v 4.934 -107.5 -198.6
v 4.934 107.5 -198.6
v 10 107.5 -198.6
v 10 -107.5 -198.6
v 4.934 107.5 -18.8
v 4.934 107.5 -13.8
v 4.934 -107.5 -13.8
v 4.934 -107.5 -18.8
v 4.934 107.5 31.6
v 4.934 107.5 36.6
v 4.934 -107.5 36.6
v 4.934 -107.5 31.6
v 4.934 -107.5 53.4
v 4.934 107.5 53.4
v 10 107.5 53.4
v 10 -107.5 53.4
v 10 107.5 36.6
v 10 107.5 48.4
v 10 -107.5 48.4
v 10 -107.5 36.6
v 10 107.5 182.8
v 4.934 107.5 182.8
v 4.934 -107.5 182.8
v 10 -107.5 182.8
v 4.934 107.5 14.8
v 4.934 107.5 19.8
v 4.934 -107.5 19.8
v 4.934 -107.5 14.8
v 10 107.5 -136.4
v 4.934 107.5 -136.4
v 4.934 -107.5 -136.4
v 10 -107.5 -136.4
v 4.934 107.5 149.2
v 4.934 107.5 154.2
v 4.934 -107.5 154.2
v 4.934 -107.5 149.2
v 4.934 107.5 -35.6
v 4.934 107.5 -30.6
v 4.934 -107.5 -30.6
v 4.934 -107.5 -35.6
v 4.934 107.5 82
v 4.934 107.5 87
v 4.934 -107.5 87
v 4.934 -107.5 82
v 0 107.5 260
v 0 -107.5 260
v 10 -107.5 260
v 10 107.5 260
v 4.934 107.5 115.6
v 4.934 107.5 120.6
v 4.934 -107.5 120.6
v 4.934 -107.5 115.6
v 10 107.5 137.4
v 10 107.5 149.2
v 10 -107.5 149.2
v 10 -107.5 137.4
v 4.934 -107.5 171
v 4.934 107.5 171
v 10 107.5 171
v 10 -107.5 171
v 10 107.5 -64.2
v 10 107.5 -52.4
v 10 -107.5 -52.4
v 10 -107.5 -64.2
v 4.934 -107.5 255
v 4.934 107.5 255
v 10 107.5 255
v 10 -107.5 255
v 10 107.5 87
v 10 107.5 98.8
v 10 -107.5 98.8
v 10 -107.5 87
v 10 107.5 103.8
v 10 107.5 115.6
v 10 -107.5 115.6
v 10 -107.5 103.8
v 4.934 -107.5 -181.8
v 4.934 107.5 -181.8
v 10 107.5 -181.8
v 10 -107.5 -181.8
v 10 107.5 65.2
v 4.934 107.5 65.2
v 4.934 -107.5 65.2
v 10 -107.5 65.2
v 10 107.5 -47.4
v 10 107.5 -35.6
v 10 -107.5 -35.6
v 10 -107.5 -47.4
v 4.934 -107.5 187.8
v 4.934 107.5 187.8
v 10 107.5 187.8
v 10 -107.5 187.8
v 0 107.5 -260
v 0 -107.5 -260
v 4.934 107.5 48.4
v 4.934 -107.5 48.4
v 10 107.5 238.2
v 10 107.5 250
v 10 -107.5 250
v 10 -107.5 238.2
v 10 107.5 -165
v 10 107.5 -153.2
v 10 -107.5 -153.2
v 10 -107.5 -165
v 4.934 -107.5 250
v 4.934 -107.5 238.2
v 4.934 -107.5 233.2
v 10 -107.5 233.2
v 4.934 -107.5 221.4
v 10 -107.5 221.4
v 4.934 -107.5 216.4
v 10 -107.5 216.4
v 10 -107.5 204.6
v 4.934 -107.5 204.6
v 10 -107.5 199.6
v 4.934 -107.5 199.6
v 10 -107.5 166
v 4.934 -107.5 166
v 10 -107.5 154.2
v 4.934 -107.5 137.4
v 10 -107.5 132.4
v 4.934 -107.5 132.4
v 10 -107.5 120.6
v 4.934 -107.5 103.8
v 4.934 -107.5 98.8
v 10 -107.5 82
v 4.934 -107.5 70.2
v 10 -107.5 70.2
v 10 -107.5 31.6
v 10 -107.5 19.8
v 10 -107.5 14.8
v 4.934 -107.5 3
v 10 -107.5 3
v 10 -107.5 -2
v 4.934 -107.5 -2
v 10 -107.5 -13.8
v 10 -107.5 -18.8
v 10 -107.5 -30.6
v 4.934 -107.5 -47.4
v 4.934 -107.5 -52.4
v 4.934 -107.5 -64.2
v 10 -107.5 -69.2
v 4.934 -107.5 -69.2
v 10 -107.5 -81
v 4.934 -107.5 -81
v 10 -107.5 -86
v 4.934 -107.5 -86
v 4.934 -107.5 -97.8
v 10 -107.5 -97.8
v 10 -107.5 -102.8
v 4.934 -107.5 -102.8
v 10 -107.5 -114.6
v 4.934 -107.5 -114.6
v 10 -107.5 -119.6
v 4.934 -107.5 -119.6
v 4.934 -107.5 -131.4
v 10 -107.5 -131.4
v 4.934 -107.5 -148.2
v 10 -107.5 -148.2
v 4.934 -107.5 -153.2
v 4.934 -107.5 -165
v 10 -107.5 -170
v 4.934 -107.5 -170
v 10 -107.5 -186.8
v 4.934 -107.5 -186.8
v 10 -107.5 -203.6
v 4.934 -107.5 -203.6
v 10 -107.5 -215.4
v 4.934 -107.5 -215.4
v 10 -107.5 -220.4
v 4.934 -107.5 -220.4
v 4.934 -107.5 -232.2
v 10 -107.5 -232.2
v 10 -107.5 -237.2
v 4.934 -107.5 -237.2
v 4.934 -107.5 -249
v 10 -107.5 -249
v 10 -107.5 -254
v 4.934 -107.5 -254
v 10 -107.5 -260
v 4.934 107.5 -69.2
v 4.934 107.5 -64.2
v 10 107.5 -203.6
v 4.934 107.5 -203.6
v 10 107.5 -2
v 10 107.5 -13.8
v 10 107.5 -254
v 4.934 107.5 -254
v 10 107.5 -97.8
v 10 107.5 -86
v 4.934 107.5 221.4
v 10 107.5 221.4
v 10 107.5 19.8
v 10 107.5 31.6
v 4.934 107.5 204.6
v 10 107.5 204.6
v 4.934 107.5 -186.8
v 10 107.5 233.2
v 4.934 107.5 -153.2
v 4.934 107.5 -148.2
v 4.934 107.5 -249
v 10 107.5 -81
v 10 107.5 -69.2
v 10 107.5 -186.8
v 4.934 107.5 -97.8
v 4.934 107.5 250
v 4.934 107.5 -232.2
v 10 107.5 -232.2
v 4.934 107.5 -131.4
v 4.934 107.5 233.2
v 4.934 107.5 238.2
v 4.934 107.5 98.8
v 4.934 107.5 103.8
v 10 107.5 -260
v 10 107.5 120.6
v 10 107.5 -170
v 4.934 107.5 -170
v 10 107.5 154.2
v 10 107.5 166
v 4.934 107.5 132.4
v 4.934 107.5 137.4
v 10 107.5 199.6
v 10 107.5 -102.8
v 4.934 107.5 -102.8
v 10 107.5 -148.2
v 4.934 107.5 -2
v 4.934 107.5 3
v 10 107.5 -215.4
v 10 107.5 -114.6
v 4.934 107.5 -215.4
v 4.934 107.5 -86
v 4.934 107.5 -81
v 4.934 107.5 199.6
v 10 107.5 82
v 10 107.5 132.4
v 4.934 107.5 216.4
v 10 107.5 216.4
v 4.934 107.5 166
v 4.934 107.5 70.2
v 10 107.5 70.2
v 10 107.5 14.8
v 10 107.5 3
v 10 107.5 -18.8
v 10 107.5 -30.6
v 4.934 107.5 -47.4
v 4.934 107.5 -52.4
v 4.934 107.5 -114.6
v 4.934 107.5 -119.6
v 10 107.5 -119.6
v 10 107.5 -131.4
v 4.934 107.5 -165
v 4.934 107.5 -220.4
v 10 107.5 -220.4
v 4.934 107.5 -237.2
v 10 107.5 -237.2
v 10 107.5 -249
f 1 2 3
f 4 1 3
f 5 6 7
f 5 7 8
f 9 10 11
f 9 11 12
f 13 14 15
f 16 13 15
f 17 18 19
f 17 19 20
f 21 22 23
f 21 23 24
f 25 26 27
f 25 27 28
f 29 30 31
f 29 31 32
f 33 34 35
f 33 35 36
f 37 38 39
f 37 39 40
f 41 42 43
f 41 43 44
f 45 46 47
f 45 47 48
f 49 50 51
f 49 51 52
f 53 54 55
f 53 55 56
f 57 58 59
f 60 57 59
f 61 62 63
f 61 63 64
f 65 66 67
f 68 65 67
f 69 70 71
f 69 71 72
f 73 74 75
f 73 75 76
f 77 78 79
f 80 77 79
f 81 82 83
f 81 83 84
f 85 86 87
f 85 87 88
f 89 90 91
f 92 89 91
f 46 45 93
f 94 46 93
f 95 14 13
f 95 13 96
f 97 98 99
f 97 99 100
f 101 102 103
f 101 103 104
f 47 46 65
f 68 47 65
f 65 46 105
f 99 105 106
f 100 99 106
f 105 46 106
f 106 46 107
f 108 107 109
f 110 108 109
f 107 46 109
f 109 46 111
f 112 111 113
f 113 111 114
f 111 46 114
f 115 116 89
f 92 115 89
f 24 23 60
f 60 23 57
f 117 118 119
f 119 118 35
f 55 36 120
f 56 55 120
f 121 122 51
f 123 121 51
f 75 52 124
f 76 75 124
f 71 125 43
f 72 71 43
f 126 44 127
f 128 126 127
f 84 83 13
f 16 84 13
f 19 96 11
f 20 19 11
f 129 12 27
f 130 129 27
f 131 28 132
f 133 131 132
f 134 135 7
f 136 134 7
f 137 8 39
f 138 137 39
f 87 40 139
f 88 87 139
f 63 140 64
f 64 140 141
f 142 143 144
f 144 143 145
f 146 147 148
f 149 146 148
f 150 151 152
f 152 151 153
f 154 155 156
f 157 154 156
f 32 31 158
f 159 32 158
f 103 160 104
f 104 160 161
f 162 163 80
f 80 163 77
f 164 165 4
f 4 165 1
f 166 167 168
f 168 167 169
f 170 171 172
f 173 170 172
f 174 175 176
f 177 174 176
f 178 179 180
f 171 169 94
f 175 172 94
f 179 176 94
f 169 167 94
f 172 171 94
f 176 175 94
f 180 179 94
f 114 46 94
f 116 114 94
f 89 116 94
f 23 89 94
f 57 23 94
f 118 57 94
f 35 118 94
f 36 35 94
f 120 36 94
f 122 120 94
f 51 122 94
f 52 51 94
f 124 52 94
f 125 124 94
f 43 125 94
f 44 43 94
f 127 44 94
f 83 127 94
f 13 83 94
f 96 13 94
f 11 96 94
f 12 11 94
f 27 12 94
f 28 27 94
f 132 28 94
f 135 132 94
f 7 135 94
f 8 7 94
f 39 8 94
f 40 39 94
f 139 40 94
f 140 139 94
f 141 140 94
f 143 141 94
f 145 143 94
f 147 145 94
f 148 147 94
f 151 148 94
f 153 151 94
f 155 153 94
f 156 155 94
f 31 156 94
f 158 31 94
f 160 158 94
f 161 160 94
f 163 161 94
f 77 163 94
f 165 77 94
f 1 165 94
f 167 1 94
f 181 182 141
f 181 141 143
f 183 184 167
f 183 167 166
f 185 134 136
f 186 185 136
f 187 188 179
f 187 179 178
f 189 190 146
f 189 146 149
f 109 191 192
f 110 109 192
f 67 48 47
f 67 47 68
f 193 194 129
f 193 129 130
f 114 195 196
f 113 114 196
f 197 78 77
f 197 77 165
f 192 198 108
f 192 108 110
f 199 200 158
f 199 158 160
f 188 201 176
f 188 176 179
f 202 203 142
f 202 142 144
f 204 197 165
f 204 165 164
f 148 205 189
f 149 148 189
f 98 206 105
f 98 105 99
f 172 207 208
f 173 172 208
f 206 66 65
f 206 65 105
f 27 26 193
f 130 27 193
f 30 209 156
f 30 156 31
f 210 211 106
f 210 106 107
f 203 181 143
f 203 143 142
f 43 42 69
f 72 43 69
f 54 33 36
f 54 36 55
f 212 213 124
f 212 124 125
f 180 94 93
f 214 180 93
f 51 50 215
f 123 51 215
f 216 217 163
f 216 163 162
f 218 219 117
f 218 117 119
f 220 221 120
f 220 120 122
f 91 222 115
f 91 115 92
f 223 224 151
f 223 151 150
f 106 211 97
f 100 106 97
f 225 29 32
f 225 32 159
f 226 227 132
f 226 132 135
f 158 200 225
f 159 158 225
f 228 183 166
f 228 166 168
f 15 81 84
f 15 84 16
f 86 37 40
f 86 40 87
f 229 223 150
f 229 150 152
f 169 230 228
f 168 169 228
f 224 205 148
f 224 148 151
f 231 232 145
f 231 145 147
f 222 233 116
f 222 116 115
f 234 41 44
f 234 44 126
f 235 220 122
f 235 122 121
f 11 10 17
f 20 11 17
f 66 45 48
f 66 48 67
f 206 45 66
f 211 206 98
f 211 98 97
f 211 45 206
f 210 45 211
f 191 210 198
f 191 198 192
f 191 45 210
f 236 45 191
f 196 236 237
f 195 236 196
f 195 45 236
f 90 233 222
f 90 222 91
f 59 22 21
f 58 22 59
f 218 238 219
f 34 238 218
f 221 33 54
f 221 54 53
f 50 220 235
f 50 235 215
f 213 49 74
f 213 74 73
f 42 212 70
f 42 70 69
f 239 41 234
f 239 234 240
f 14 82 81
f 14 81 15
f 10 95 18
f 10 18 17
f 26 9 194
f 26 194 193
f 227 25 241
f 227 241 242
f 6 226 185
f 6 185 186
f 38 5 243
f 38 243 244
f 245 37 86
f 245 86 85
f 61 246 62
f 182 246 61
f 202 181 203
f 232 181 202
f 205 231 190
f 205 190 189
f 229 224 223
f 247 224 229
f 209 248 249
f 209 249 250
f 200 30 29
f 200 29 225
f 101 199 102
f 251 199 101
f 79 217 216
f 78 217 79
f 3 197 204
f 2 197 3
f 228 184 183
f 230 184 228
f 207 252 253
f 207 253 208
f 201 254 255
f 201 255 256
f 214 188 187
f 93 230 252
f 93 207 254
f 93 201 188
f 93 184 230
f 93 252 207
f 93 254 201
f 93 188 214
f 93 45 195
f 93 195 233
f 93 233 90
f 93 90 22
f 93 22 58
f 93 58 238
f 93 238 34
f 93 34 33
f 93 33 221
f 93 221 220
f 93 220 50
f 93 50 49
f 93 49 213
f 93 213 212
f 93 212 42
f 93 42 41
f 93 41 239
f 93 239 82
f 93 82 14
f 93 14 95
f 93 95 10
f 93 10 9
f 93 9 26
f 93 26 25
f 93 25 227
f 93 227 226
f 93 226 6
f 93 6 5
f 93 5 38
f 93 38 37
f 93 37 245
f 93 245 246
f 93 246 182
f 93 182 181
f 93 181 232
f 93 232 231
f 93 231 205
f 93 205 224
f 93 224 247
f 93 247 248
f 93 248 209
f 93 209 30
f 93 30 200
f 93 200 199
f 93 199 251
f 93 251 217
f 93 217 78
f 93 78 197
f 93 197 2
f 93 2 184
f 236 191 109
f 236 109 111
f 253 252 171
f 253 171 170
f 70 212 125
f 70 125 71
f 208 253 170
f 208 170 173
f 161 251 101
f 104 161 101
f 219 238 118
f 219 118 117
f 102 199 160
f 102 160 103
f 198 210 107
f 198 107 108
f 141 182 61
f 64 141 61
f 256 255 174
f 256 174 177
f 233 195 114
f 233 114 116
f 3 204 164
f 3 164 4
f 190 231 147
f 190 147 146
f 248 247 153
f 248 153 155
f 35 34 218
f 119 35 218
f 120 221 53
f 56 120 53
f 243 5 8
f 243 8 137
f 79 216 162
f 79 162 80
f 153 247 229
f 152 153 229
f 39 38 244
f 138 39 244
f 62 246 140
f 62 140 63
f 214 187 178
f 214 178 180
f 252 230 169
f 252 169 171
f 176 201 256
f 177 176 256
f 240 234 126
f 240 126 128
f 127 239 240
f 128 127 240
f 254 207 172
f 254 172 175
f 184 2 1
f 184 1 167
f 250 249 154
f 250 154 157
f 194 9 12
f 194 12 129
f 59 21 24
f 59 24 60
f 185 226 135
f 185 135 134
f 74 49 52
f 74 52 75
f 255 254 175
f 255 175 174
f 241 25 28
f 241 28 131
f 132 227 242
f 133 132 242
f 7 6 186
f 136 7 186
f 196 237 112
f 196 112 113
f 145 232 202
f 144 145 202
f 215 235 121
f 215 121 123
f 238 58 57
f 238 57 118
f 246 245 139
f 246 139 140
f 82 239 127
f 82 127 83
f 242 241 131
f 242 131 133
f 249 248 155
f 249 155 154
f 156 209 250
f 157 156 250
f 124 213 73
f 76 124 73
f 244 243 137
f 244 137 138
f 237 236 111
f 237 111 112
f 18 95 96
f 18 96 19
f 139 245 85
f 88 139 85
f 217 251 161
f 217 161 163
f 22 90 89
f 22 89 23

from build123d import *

# Parameters (mm, degrees)
SKETCH1_W           = 520
SKETCH1_H           = 215
BOSS_EXTRUDE1_DEPTH = 10
SKETCH2_W           = 10.131829772
SKETCH2_H           = 5
CUT_EXTRUDE1_DEPTH  = 216
LPATTERN1_COUNT     = 31
LPATTERN1_PITCH     = 16.8


with BuildPart() as part:
    # Sketch1 → Boss-Extrude1 (new body)
    with BuildSketch(Plane(origin=(0, 0, 0), x_dir=(0, 0, -1), z_dir=(1, 0, 0))):
        Rectangle(SKETCH1_W, SKETCH1_H)
    extrude(amount=BOSS_EXTRUDE1_DEPTH)

    # Sketch2 → Cut-Extrude1 (cut, through all)
    with BuildSketch(Plane(origin=(0, 107.5, 0), x_dir=(1, 0, 0), z_dir=(0, 1, 0))):
        with Locations((10, -252.5)):
            Rectangle(SKETCH2_W, SKETCH2_H)
    cut_extrude1 = extrude(amount=-CUT_EXTRUDE1_DEPTH, mode=Mode.SUBTRACT)

    # LPattern1: Cut-Extrude1 ×31
    with Locations(*[(0, 0, -i * LPATTERN1_PITCH) for i in range(1, LPATTERN1_COUNT)]):
        add(cut_extrude1, mode=Mode.SUBTRACT)


solid = part.part
